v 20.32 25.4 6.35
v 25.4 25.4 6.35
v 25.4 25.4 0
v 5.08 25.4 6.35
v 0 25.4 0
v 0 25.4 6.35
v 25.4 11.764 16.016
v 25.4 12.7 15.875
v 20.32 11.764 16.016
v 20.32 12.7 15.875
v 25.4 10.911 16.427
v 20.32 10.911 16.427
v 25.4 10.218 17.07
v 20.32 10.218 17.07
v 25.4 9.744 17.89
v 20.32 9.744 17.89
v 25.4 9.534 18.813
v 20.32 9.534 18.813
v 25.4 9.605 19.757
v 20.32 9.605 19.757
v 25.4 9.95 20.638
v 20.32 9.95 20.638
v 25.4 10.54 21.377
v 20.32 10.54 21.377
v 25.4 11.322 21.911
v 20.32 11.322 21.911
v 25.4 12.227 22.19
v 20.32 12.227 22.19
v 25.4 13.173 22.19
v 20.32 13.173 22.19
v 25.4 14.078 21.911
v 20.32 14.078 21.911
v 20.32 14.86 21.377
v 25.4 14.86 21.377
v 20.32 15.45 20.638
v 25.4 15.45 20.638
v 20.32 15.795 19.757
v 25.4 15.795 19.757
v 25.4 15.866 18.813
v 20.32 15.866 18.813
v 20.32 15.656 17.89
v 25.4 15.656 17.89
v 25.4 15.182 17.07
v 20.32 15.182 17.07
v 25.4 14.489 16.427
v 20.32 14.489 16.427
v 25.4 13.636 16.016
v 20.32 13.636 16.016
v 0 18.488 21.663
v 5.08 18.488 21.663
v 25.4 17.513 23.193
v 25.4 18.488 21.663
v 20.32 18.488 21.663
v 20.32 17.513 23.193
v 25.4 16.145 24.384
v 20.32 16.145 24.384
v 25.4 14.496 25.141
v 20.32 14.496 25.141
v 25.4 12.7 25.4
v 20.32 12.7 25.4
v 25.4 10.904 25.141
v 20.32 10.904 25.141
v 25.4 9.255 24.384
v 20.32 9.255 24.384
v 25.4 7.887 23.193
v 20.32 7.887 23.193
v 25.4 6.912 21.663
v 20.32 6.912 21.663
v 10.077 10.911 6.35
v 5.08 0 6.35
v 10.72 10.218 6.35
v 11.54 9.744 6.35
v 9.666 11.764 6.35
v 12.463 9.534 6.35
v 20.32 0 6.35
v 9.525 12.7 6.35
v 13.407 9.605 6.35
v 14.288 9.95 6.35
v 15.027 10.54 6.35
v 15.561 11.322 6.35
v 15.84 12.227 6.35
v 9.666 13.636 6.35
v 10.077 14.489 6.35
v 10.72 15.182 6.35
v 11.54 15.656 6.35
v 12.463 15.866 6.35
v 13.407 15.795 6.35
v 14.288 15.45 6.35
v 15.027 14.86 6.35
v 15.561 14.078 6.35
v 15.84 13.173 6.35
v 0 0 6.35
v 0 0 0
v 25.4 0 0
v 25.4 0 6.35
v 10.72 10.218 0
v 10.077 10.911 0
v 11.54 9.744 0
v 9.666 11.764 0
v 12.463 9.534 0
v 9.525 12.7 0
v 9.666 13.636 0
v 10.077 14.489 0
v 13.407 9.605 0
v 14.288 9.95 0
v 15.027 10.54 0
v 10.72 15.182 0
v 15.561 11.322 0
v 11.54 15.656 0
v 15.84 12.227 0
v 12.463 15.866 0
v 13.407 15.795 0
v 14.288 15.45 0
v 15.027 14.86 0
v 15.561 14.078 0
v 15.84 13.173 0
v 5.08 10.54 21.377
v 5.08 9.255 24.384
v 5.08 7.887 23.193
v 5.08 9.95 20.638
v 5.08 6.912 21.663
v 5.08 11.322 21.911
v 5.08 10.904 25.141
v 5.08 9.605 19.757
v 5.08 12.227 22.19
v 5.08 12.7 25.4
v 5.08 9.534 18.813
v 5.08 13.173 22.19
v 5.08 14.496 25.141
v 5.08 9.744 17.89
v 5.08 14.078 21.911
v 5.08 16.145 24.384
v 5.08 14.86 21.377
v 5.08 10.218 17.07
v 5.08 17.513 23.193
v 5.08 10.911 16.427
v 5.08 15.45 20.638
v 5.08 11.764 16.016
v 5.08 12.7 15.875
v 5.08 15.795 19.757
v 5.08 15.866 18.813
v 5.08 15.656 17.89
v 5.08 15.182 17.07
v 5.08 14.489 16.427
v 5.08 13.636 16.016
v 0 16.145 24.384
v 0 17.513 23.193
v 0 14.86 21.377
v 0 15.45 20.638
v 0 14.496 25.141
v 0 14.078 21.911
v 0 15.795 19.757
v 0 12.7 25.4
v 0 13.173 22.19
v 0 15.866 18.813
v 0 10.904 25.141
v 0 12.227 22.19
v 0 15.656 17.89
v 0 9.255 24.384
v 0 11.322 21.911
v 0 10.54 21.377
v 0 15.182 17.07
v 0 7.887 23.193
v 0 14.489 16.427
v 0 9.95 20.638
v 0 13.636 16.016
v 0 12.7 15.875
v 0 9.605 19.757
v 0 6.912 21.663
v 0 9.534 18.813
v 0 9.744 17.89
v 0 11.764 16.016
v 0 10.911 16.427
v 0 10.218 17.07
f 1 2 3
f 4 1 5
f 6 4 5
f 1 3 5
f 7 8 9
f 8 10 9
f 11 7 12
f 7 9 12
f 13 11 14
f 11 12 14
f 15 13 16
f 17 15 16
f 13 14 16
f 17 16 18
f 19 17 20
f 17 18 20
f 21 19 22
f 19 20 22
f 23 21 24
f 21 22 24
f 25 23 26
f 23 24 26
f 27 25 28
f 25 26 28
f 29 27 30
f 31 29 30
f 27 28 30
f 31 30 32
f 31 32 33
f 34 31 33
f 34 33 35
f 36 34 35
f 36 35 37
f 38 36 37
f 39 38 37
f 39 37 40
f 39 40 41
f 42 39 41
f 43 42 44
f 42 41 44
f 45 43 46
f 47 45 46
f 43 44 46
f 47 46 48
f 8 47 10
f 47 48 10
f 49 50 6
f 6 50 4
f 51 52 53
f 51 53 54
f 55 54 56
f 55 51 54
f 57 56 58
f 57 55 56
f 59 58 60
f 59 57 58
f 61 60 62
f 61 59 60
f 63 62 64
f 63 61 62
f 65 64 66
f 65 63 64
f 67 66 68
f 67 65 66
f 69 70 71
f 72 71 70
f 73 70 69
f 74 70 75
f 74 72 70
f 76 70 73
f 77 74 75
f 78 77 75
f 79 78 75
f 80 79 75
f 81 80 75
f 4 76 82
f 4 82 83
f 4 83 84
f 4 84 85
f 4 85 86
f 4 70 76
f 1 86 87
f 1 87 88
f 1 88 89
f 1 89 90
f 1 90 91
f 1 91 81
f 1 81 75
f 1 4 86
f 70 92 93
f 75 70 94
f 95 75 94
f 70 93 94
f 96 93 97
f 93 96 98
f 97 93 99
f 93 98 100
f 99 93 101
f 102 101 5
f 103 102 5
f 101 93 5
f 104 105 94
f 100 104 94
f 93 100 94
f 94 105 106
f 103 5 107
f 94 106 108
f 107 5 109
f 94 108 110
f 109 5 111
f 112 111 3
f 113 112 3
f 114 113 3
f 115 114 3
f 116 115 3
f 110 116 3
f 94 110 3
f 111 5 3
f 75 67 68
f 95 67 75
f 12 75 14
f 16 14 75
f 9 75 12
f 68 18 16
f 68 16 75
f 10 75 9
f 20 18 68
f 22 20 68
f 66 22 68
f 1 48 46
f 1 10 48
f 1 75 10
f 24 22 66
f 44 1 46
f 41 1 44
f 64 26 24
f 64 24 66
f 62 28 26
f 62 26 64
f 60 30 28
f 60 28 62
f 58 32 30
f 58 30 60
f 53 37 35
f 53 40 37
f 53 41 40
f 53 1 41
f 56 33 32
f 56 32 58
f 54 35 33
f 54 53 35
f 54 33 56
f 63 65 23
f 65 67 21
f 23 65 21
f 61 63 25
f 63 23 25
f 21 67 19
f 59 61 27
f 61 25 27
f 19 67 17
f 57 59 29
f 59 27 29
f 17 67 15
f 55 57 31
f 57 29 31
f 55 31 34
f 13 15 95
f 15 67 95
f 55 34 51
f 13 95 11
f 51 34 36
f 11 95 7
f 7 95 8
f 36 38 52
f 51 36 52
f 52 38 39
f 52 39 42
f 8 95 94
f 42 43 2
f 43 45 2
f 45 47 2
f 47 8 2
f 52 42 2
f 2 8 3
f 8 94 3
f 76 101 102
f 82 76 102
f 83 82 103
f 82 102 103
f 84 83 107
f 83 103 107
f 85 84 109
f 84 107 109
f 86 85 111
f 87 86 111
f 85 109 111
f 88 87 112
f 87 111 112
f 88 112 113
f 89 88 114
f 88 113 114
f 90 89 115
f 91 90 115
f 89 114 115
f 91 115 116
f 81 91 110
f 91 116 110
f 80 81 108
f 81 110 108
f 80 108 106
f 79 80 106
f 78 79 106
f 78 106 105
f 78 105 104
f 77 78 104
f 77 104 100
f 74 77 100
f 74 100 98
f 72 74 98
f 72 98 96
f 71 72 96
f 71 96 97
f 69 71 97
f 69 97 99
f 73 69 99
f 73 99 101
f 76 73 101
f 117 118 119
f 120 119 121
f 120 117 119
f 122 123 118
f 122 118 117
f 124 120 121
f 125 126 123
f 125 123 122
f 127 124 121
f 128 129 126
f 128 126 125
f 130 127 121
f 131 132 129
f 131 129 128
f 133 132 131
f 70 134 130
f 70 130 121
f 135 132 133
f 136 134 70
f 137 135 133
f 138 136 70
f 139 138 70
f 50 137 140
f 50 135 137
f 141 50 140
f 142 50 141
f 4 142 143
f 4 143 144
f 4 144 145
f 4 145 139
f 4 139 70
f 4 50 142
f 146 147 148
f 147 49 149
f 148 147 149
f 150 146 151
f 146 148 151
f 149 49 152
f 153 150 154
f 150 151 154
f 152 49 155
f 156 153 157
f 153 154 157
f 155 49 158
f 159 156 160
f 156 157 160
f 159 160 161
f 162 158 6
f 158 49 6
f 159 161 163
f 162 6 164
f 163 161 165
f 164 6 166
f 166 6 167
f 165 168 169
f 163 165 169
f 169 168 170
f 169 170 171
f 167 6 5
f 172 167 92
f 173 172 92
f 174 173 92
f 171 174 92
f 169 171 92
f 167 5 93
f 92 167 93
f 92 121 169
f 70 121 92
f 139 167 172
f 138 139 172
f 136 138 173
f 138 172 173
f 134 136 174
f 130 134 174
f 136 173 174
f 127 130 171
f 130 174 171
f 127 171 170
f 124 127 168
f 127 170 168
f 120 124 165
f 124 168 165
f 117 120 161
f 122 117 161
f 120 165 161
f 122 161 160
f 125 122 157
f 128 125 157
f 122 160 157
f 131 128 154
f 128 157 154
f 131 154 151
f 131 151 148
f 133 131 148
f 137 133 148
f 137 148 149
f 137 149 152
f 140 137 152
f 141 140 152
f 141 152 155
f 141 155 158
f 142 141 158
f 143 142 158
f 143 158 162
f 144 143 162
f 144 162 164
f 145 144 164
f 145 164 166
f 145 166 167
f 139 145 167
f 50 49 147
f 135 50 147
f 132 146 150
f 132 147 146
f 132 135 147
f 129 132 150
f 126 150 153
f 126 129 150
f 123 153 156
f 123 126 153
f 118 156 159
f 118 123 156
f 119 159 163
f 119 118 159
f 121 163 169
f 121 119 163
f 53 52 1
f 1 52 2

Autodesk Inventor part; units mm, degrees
ref_plane "YZ Plane" through (0, 0, 0) normal (1, 0, 0) x (0, 1, 0)
ref_plane "XZ Plane" through (0, 0, 0) normal (0, 1, 0) x (-1, 0, 0)
ref_plane "XY Plane" through (0, 0, 0) normal (0, 0, 1) x (1, 0, 0)
sketch "Sketch1" plane through (0, 0, 0) normal (0, 0, 1) x (1, 0, 0)
  line L0 (0, 0) -> (25.4, 0)
  line L1 (25.4, 0) -> (25.4, 25.4)
  line L2 (25.4, 25.4) -> (0, 25.4)
  line L3 (0, 25.4) -> (0, 0)
  dimension "d0" = 25.4
  dimension "d1" = 25.4
extrude "Extrusion1" add sketch "Sketch1" along normal blind 25.4
sketch "Sketch2" plane through (25.4, 0, 0) normal (1, 0, 0) x (0, 0, -1)
  line L0 (0, 0) -> (0, 25.4) projected
  line L1 (0, 25.4) -> (-25.4, 25.4) projected
  line L2 (-25.4, 0) -> (-25.4, 25.4) projected
  line L3 (0, 0) -> (-25.4, 0) projected
  circle A0 centre (-19.05, 12.7) radius 6.35
  line L4 (-21.6626, 18.4876) -> (-6.35, 25.4)
  line L5 (-21.6626, 6.9124) -> (-6.35, 0)
  line L6 (0, 12.7) -> (-19.05, 12.7) construction
  dimension "d4" = 12.7
  dimension "d5" = 6.35
extrude "Extrusion2" cut sketch "Sketch2" against normal through all contours L3 L2 A0 L5 | L4 A0 L2 L1
sketch "Sketch3" plane through (25.4, 0, 0) normal (1, 0, 0) x (0, 0, -1)
  arc A0 (-21.6626, 18.4876) -> (-21.6626, 6.9124) centre (-19.05, 12.7) ccw projected
hole "Hole1" at (25.4, 12.7, 19.05) direction (-1, 0, 0) diameter 6.35 end through all
sketch "Sketch4" plane through (0, 25.4, 0) normal (0, 1, 0) x (1, 0, 0)
  line L0 (0, -6.35) -> (25.4, -6.35) projected
  line L1 (25.4, 0) -> (25.4, -6.35) projected
  line L2 (0, 0) -> (0, -6.35) projected
  line L3 (25.4, -25.4) -> (0, -25.4) projected
  line L4 (5.08, -6.35) -> (20.32, -6.35)
  line L5 (20.32, -6.35) -> (20.32, -25.4)
  line L6 (20.32, -25.4) -> (5.08, -25.4)
  line L7 (5.08, -25.4) -> (5.08, -6.35)
  dimension "d15" = 5.08
  dimension "d16" = 5.08
extrude "Extrusion3" cut sketch "Sketch4" against normal through all
sketch "Sketch5" plane through (0, 0, 0) normal (0, 0, -1) x (-1, 0, 0)
  line L0 (-25.4, 25.4) -> (0, 0) construction
  circle A0 centre (-12.7, 12.7) radius 3.175
  dimension "d19" = 6.35
extrude "Extrusion4" cut sketch "Sketch5" against normal through all
equation "\"d16\" = d15"
properties part number "Joint" material "Aluminum 6061"
